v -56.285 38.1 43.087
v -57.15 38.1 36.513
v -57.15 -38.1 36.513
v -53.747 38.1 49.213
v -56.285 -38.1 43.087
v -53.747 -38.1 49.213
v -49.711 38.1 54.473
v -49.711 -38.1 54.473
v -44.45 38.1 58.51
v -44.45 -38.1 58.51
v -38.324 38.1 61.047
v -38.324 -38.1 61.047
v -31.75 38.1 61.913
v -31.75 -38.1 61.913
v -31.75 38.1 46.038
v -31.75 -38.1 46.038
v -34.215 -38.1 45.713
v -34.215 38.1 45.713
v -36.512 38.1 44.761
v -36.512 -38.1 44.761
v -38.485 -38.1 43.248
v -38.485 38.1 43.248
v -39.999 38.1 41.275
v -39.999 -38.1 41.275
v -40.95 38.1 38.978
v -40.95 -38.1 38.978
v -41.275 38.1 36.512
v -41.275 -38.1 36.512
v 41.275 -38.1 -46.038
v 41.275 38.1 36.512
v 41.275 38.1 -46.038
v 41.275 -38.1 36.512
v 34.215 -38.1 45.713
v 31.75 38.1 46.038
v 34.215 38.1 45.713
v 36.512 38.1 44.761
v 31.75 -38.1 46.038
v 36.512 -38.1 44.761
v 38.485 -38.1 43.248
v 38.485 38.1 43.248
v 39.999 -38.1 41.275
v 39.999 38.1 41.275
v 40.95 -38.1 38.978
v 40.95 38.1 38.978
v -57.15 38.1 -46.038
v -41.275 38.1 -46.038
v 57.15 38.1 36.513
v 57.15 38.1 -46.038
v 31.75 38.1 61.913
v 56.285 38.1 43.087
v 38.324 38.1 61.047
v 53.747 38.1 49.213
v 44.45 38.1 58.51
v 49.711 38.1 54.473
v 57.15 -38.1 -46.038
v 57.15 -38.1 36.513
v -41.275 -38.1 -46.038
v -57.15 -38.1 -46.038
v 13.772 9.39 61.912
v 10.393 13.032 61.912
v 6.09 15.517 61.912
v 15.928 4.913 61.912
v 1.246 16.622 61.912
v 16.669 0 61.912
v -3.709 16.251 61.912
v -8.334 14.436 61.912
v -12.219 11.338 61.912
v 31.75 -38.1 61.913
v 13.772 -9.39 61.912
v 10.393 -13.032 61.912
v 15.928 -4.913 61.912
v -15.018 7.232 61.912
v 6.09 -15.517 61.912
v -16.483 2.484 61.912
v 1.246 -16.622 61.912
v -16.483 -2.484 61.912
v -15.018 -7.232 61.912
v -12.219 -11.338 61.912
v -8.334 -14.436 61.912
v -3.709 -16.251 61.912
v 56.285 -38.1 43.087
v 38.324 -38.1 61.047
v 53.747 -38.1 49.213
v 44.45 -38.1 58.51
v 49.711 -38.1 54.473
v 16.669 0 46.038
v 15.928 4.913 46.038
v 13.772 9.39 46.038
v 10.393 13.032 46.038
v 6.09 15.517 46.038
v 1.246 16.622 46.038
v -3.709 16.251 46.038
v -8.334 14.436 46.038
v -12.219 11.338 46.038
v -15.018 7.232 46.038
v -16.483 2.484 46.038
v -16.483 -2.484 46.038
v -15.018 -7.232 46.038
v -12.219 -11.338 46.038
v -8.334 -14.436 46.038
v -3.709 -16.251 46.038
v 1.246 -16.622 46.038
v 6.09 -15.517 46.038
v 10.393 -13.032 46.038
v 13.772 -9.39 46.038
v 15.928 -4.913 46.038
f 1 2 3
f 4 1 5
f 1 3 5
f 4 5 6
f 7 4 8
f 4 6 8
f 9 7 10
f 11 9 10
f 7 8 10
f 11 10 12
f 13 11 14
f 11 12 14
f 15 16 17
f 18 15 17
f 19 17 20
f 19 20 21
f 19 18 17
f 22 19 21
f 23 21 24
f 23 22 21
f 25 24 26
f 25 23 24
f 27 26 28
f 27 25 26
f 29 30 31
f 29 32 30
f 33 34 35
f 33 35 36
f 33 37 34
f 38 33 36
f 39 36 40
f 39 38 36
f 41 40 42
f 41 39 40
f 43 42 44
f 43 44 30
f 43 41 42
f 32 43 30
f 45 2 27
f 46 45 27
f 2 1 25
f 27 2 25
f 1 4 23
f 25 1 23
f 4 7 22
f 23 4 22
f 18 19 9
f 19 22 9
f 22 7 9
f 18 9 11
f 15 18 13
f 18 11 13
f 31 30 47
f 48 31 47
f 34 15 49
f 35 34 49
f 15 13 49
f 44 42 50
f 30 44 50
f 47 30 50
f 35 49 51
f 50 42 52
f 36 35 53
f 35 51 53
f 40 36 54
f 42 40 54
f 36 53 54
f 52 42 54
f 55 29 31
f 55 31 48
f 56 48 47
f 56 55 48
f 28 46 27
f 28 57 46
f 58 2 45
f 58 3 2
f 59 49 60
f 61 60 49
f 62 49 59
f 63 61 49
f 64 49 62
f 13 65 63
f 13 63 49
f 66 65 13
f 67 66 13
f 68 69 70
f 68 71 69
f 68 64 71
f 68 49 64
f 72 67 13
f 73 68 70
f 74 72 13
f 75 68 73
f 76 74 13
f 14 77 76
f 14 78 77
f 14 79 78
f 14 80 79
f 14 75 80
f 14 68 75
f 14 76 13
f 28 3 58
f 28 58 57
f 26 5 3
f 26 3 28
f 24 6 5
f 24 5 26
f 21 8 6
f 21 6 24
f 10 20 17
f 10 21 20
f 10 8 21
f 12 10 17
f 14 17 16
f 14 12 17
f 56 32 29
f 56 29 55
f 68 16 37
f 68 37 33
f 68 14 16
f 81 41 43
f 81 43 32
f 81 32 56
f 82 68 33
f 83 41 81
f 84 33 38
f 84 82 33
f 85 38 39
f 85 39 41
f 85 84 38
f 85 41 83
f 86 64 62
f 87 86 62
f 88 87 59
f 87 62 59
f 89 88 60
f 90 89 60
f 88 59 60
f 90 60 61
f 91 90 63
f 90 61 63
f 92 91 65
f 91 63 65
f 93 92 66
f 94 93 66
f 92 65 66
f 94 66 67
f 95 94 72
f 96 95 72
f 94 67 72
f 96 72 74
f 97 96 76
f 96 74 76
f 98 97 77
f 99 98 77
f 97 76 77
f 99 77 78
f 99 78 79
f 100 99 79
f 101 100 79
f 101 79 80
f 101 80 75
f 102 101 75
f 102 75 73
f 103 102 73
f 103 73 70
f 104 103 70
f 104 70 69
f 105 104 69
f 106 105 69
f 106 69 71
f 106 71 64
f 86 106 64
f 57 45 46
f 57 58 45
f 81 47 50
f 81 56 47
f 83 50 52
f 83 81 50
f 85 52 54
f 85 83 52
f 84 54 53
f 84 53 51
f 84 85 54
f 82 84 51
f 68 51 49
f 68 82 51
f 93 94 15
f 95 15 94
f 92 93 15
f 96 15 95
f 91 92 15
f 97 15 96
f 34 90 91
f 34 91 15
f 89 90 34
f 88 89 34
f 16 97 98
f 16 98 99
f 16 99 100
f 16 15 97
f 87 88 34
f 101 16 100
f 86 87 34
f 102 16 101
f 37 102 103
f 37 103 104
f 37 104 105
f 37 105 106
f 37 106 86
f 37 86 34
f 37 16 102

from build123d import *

# Parameters (mm, degrees)
F1_DEPTH = 38.1
F2_R     = 9.525
F3_R     = 25.4
F4_R     = 16.66875
F5_DEPTH = 25.4


with BuildPart() as f1:
    # F0 (on Front) → F1 (new body, symmetric)
    with BuildSketch(Plane.XZ):
        Polygon((-41.275, 46.0375), (41.275, 46.0375), (41.275, -46.0375), (57.15, -46.0375), (57.15, 46.0375), (57.15, 61.9125), (41.275, 61.9125), (-41.275, 61.9125), (-57.15, 61.9125), (-57.15, 46.0375), (-57.15, -46.0375), (-41.275, -46.0375), align=None)
    extrude(amount=F1_DEPTH, both=True)

    # F2
    f2_edges = [f1.edges().sort_by_distance(p)[0] for p in [
        (-41.275, 0, 46.0375),
        (41.275, 0, 46.0375),
    ]]
    fillet(f2_edges, radius=F2_R)

    # F3
    f3_edges = [f1.edges().sort_by_distance(p)[0] for p in [
        (-57.15, 0, 61.9125),
        (57.15, 0, 61.9125),
    ]]
    fillet(f3_edges, radius=F3_R)

    # F4 (on face) → F5 (cut)
    with BuildSketch(Plane.XY.offset(61.9125)):
        Circle(F4_R)
    extrude(amount=-F5_DEPTH, mode=Mode.SUBTRACT)


solid = f1.part
